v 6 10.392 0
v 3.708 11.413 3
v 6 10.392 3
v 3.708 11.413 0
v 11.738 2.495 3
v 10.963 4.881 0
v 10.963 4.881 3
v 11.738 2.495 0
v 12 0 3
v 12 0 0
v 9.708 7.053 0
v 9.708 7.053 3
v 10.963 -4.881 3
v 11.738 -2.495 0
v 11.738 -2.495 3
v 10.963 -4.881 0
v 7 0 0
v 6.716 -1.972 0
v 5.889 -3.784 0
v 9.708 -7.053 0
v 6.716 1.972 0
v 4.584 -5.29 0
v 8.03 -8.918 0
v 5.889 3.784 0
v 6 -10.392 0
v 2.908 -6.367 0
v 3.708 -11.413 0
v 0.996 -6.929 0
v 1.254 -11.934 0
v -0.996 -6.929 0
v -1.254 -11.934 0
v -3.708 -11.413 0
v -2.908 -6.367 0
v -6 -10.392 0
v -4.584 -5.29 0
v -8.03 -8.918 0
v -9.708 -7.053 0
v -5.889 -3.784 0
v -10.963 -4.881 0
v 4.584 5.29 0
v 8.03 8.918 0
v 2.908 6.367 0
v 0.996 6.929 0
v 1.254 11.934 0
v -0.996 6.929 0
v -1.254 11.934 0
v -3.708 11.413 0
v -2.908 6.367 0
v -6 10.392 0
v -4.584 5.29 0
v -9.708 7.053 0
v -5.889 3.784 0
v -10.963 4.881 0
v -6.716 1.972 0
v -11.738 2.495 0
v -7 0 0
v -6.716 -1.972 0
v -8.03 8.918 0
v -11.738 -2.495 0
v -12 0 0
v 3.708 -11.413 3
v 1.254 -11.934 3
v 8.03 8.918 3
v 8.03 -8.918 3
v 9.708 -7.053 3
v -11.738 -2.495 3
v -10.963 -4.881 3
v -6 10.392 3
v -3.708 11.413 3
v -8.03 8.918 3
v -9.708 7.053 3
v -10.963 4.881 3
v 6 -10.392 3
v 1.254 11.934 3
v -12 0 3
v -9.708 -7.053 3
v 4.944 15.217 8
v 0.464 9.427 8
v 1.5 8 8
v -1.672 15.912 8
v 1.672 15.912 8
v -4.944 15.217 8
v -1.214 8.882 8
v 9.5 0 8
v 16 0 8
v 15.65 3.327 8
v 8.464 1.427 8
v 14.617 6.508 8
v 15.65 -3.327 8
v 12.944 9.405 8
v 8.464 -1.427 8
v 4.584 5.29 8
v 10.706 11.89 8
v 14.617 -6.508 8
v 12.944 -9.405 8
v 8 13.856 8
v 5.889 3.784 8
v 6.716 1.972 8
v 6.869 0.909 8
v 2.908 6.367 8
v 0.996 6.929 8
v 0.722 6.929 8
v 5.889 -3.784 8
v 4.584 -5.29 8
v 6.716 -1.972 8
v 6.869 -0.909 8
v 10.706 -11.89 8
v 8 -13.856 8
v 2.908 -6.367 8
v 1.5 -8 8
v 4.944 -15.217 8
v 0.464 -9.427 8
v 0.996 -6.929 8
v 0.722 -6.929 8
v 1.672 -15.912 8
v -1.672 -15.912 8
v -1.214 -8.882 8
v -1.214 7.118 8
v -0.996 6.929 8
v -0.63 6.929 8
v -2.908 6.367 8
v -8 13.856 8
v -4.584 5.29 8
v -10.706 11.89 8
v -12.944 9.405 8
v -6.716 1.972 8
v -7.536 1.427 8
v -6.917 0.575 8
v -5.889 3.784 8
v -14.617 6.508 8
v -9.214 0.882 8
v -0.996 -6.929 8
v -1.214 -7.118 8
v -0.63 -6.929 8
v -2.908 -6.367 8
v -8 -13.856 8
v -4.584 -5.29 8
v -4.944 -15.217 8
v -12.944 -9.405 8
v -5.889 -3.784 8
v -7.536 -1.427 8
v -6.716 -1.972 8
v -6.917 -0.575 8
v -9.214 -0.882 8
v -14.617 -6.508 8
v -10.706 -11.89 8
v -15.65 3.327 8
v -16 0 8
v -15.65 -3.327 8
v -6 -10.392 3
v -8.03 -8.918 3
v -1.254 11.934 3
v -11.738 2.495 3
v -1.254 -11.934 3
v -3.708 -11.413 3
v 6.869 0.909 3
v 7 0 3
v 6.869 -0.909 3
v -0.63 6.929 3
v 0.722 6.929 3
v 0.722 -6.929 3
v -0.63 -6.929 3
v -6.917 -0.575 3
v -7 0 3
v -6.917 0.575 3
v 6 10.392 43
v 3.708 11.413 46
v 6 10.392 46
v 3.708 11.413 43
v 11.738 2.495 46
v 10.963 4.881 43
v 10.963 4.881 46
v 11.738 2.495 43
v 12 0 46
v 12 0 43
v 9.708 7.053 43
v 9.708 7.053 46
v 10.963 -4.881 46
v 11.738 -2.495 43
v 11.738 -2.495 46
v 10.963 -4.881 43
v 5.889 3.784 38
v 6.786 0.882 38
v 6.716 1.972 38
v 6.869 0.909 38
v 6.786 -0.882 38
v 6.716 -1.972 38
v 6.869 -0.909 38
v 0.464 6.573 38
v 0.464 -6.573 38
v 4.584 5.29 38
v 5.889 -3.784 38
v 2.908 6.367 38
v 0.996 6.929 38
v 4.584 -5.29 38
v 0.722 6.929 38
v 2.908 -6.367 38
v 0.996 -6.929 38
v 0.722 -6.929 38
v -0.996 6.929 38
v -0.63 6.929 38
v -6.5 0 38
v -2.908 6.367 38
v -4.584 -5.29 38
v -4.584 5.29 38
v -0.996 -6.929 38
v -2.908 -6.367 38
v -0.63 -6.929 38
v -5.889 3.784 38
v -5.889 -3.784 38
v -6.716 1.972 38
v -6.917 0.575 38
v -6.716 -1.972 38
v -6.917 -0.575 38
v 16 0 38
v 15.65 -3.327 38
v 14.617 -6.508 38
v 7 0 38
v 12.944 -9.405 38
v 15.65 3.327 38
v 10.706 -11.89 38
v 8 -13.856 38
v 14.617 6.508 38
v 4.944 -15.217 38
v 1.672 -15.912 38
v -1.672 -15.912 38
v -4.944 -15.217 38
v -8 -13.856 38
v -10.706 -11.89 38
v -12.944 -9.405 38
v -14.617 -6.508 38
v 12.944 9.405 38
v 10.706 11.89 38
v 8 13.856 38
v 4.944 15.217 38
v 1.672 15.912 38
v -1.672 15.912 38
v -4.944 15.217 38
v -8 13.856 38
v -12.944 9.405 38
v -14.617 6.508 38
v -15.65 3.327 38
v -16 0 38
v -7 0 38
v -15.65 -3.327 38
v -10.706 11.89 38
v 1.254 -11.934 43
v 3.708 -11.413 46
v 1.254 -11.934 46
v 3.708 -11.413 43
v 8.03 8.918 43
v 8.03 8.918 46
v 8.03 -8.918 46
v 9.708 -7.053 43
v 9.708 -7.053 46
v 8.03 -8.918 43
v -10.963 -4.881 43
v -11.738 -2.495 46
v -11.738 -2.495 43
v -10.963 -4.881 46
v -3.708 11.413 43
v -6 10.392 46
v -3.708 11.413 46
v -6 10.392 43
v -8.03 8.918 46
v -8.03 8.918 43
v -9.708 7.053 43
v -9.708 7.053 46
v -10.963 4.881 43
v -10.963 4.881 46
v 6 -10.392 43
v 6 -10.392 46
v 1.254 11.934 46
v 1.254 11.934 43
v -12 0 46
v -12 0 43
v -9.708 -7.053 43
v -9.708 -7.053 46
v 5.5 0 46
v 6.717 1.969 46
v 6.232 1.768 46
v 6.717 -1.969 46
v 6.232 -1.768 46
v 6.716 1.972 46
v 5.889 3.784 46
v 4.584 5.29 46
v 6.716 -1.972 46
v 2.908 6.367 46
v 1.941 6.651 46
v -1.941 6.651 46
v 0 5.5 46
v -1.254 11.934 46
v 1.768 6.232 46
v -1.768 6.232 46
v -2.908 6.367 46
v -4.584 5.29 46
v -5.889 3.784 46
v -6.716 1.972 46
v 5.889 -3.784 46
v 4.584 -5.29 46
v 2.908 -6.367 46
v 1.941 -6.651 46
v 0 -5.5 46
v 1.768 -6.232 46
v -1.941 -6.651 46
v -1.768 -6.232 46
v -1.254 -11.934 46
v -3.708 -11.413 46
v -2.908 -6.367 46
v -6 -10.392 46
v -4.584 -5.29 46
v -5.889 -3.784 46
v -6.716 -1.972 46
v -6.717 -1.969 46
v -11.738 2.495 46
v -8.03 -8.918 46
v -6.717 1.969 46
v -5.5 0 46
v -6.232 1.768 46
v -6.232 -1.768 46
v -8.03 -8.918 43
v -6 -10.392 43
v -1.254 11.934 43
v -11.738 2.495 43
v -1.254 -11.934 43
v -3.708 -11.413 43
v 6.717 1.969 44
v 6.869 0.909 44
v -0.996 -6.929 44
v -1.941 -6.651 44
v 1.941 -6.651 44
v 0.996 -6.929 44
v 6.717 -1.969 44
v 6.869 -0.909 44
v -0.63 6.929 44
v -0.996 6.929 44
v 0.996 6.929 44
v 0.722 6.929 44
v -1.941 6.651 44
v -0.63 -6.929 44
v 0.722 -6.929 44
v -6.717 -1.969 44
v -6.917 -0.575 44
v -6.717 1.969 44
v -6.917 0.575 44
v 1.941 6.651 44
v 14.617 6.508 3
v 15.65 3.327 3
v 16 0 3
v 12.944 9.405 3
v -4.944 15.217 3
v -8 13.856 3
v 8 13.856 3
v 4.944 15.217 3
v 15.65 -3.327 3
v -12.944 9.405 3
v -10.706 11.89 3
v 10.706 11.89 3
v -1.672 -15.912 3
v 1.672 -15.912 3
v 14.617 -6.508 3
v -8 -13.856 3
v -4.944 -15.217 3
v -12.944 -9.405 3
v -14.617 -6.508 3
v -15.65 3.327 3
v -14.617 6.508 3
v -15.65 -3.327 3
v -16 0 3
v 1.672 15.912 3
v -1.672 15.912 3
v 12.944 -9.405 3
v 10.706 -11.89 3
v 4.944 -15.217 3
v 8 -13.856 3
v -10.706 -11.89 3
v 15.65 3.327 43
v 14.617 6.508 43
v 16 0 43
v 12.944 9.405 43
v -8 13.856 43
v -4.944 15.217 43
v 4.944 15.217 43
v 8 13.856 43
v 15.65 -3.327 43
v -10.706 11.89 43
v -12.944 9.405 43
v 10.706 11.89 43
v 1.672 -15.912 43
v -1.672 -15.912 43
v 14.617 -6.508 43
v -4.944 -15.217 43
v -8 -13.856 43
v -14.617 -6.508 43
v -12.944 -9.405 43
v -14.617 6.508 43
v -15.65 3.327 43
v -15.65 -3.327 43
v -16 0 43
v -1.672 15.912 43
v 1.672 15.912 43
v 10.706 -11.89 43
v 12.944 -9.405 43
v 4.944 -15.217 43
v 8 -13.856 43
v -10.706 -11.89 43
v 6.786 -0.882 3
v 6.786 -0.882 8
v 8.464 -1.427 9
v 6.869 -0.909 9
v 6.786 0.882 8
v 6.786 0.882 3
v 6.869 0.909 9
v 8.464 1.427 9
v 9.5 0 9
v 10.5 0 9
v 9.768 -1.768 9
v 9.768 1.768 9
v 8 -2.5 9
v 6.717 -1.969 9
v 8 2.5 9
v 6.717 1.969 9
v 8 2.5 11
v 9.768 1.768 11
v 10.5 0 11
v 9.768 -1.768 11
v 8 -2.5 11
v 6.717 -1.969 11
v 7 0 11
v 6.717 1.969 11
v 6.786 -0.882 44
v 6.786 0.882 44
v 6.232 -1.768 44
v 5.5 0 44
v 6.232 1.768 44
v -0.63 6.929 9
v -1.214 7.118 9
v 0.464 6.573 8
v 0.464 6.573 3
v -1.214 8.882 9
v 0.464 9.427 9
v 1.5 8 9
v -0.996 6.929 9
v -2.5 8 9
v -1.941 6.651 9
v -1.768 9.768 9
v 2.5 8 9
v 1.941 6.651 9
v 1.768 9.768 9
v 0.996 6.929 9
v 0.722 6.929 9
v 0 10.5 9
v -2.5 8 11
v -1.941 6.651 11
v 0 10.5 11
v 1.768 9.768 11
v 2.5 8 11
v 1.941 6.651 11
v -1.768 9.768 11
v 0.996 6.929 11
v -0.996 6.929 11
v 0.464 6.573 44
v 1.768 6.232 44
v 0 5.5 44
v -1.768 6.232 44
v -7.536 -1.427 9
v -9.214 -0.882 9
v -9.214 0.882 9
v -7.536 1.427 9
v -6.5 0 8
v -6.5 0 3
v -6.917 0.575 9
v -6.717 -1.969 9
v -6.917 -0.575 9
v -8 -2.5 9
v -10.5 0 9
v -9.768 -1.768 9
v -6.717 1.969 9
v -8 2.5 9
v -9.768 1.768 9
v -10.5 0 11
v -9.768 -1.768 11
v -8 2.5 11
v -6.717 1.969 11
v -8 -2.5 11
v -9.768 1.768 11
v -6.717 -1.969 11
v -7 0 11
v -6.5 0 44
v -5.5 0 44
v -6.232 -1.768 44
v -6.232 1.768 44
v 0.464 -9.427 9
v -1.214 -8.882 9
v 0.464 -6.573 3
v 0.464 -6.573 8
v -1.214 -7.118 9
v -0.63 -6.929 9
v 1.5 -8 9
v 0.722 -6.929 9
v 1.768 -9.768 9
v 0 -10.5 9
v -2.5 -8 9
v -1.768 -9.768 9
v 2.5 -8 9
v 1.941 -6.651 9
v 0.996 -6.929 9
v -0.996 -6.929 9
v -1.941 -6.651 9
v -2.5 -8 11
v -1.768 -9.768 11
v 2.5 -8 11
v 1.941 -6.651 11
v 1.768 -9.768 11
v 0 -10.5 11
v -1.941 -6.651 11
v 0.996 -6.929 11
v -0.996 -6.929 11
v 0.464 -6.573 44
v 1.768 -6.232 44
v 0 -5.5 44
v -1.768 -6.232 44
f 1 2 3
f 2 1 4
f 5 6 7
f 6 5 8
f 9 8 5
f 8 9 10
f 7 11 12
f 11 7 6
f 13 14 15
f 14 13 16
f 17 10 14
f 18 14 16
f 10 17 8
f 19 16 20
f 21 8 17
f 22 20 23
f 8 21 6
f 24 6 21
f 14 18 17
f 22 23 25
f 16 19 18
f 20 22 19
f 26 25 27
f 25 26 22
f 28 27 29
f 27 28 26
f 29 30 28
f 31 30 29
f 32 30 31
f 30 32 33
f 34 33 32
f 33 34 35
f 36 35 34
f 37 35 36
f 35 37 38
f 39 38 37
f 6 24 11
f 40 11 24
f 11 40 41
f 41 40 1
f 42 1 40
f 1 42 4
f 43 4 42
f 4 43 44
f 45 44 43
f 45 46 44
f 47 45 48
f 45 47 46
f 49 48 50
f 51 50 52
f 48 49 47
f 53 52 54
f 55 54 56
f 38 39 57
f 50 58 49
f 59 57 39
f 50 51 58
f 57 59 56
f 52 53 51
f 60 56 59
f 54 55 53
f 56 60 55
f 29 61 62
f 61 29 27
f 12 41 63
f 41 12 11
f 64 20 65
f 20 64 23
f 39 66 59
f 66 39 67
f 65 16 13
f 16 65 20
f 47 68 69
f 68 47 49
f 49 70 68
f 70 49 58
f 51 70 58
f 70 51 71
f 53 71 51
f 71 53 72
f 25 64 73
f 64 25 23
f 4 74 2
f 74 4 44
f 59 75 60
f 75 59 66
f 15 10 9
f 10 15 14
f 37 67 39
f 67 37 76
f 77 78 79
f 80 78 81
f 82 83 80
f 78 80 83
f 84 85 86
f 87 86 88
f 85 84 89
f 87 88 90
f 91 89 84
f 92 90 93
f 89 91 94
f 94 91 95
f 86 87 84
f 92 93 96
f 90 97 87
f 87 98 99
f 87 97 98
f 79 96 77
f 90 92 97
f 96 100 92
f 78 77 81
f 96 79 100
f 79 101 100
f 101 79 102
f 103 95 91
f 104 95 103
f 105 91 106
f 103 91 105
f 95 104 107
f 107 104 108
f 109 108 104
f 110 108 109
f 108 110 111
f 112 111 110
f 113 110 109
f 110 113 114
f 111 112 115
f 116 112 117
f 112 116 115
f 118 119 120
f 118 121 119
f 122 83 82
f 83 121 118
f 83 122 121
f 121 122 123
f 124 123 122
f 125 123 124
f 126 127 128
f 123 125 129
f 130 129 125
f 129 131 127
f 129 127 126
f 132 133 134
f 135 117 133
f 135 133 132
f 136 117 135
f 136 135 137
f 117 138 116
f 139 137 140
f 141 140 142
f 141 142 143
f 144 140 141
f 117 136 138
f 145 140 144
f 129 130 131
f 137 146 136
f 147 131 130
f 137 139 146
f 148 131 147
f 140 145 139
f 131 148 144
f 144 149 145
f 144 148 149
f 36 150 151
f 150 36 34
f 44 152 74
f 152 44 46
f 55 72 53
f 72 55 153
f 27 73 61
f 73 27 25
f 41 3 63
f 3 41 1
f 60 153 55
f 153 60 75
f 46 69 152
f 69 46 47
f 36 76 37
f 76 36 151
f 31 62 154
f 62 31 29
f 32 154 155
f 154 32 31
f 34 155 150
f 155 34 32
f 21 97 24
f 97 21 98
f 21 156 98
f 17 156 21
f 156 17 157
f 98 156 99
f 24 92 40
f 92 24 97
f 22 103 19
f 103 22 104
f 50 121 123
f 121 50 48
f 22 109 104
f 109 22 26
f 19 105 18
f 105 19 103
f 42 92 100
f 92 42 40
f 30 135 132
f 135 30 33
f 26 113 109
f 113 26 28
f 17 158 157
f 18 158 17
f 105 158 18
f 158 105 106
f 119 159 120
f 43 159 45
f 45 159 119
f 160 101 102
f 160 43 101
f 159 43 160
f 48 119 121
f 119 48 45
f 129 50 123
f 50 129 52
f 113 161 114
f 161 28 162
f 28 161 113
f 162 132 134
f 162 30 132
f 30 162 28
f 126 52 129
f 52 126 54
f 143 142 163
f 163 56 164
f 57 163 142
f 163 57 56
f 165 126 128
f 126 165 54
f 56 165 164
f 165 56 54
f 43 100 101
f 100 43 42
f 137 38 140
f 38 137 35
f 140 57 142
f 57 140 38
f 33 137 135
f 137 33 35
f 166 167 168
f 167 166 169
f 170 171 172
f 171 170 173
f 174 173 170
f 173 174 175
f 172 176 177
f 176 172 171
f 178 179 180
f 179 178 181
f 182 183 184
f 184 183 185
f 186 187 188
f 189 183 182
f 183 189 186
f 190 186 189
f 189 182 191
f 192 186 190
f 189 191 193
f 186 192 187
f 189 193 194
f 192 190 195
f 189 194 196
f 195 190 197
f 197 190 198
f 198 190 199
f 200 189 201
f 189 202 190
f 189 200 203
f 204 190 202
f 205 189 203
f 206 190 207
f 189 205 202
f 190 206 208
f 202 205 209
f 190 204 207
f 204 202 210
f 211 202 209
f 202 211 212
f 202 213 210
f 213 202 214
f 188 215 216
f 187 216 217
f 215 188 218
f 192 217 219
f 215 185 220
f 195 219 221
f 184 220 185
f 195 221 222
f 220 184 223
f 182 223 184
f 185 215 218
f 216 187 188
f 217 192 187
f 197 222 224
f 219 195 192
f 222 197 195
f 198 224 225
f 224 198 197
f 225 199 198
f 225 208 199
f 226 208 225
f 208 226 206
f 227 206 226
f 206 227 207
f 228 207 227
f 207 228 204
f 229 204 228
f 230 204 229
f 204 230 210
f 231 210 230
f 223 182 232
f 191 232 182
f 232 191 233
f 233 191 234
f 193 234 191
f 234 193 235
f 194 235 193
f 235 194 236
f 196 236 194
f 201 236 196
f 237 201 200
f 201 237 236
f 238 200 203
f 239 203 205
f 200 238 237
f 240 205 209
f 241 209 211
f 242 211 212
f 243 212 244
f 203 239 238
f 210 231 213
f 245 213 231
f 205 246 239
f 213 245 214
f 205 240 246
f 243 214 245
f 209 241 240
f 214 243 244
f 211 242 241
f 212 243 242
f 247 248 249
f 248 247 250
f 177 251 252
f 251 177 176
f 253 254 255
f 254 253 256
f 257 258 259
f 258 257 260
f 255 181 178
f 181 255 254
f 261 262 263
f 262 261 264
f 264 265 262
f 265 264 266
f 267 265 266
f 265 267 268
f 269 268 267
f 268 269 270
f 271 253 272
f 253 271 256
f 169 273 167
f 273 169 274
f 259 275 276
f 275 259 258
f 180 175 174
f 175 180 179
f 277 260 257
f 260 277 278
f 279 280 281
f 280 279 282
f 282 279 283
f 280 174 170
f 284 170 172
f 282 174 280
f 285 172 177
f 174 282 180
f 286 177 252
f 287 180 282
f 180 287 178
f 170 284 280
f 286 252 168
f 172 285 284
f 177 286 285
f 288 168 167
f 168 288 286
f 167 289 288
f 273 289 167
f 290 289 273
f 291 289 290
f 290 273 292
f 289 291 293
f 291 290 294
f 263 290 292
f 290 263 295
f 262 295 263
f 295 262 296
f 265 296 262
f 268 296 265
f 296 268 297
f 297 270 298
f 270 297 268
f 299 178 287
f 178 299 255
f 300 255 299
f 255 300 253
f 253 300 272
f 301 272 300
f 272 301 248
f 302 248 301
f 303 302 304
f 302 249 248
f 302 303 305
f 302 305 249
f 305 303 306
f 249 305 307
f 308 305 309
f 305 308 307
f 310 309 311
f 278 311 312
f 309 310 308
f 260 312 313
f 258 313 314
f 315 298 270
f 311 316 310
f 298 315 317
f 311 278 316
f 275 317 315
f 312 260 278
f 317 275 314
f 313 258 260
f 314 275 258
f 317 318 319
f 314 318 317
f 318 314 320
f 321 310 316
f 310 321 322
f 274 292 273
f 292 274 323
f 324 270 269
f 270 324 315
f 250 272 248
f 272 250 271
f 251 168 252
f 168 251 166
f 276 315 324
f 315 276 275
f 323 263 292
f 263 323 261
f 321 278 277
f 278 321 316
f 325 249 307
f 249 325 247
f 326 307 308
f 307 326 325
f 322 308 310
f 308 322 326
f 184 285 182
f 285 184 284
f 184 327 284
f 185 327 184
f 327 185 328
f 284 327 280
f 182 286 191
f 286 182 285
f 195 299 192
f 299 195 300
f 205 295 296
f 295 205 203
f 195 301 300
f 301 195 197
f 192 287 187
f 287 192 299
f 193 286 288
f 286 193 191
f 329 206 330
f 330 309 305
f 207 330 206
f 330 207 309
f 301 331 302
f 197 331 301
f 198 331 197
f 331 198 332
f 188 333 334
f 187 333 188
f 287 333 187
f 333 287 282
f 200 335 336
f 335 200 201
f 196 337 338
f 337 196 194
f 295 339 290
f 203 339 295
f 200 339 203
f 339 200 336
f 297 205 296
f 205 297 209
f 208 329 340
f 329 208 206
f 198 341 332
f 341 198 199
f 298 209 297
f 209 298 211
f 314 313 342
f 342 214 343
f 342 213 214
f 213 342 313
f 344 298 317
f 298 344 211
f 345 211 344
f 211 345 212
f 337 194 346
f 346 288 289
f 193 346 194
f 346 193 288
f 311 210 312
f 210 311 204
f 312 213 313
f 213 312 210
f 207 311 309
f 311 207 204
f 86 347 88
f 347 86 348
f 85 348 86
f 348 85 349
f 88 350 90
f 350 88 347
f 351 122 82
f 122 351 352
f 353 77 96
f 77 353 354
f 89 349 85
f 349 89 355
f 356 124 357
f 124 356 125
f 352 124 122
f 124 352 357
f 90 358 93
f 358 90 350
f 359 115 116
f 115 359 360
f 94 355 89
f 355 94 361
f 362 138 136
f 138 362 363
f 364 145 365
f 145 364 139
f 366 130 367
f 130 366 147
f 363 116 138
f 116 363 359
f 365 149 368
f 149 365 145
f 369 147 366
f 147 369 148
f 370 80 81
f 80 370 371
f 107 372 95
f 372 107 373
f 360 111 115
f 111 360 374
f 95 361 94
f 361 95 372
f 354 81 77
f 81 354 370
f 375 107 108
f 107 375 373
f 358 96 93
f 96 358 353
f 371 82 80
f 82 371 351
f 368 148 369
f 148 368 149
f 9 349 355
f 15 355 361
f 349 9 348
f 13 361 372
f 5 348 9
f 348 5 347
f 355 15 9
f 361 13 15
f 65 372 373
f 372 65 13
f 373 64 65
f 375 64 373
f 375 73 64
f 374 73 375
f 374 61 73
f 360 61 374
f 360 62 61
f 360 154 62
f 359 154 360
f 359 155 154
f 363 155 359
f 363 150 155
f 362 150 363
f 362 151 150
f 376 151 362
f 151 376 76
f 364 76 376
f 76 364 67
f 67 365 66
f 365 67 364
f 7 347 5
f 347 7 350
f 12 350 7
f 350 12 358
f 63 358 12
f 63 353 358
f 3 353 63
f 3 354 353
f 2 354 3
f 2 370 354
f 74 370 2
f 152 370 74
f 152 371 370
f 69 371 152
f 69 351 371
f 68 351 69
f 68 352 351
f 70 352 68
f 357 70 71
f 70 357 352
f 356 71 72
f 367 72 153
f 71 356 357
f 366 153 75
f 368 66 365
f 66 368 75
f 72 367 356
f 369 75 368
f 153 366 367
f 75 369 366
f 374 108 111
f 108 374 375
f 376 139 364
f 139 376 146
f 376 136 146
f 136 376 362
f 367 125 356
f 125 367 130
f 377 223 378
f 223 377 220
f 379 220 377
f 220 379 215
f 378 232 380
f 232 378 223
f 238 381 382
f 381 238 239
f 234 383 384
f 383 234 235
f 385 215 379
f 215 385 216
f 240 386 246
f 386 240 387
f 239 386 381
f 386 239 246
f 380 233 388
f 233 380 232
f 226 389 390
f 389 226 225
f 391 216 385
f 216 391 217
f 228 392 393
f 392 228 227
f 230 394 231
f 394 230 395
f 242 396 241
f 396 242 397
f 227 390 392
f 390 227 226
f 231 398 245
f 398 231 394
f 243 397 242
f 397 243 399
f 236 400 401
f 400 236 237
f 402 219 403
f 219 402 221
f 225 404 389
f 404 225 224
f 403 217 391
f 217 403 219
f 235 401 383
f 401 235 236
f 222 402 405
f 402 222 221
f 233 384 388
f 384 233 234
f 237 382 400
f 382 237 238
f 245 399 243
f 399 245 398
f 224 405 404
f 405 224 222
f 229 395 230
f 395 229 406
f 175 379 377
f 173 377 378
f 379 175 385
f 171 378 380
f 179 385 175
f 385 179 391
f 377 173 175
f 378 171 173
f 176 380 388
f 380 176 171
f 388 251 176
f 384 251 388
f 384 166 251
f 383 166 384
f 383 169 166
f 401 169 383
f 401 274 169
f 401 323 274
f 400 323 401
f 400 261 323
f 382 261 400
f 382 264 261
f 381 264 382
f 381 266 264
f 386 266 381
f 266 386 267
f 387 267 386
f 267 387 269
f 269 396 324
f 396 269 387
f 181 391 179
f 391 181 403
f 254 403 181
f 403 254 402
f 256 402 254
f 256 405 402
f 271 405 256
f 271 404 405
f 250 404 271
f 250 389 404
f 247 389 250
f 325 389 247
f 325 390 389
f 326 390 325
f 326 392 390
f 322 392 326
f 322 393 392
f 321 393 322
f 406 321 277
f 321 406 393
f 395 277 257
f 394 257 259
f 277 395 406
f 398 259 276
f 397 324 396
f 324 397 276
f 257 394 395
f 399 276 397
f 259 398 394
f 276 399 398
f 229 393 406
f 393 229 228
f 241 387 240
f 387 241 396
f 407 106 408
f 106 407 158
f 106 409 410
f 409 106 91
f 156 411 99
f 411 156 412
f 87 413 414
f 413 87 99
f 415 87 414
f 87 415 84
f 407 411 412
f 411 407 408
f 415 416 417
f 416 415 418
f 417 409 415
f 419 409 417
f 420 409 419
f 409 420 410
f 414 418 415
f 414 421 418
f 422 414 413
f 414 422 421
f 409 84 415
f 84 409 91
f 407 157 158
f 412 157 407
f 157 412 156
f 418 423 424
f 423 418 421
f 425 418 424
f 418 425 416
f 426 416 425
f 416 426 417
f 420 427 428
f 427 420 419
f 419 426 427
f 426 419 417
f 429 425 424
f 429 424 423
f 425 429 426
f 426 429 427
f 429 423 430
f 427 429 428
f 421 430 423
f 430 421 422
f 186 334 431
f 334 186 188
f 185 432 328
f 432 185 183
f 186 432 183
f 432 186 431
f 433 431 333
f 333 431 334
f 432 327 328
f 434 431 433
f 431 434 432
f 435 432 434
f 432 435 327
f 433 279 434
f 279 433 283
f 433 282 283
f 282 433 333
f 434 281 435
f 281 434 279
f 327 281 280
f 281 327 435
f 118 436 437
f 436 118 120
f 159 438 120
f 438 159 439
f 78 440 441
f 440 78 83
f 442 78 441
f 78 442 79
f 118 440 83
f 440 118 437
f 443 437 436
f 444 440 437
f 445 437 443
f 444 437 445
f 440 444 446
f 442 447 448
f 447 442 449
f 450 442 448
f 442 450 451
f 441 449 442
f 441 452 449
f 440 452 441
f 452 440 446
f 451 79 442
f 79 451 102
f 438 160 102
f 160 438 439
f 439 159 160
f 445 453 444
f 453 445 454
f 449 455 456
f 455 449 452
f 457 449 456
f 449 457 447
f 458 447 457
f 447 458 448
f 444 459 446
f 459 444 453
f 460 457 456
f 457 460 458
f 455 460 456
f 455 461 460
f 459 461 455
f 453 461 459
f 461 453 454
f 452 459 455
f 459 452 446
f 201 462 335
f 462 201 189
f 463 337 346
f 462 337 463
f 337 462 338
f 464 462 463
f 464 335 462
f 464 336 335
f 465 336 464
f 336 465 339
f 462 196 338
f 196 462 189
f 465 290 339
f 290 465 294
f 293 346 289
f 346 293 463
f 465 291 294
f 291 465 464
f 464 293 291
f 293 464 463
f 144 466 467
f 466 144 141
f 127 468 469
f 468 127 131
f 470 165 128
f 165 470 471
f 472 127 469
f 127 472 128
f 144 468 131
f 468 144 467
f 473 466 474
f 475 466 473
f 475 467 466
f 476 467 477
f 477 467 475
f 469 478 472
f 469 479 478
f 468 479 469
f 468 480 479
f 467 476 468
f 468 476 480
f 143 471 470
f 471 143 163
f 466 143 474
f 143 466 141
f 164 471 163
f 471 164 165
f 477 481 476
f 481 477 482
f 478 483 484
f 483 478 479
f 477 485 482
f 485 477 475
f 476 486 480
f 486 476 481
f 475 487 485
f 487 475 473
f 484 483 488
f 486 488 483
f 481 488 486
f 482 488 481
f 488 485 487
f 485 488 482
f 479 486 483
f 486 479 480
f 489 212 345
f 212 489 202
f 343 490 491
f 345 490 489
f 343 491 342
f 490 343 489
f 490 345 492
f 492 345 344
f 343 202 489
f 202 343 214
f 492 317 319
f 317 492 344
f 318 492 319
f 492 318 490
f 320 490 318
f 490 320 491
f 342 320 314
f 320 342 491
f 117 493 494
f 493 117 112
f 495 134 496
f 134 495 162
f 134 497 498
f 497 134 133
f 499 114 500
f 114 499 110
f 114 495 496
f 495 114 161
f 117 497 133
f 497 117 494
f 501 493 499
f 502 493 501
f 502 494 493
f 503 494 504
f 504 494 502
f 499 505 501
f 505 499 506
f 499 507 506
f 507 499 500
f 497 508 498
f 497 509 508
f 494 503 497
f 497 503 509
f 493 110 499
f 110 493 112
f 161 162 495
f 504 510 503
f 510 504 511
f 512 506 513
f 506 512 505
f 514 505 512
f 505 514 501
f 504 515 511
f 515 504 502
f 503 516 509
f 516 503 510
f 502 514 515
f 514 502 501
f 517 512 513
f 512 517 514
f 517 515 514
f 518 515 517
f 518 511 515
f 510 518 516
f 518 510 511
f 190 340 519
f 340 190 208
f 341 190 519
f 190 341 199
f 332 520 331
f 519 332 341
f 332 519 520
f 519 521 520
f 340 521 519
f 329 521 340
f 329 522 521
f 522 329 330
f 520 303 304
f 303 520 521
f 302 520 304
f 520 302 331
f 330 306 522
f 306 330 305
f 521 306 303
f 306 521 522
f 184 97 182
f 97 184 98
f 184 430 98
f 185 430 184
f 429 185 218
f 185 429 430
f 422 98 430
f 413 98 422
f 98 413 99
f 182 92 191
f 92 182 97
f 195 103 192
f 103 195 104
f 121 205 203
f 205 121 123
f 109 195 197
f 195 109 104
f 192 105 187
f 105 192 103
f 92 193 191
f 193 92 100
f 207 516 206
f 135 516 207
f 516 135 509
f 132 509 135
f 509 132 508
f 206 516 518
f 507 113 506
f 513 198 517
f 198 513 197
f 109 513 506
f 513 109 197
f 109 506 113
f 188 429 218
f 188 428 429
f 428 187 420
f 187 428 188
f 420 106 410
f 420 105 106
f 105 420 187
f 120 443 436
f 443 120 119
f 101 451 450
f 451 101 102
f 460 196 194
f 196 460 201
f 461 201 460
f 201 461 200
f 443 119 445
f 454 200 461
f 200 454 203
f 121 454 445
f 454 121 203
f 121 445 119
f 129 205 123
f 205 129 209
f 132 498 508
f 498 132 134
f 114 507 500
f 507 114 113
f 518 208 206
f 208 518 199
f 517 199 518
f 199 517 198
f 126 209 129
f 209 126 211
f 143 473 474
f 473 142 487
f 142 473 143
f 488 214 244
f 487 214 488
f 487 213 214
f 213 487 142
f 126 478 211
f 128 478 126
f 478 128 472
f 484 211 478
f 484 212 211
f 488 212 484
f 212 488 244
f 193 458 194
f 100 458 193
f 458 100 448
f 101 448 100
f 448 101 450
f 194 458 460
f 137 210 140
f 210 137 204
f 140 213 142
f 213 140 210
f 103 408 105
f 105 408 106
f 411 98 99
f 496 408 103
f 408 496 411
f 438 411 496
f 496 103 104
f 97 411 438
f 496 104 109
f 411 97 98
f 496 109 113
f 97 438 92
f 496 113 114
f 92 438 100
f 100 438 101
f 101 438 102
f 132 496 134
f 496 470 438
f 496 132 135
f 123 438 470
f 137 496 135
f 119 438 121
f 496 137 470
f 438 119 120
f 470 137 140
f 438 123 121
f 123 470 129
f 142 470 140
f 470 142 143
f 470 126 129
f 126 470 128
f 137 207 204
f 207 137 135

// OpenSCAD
// Parameters
shaft_length = 30; // Shortened shaft
shaft_radius = 7;  // Increased shaft radius
hub_radius = 12;   // Adjusted hub radius for compactness
hub_length = 8;    // Shortened hub length
flange_radius = 16; // Slightly increased flange radius
flange_thickness = 5; // Thickened flange
bolt_radius = 1.5;
bolt_length = 6; // Shortened bolts
nut_radius = 2.5;
nut_thickness = 2;
bolt_hole_offset = 8; // Adjusted bolt hole offset
num_bolts = 4;

// Function to create a bolt
module bolt() {
    cylinder(h = bolt_length, r = bolt_radius);
    translate([0, 0, bolt_length])
        cylinder(h = nut_thickness, r = nut_radius);
}

// Function to create a flange plate
module flange_plate() {
    difference() {
        cylinder(h = flange_thickness, r = flange_radius);
        cylinder(h = flange_thickness + 1, r = shaft_radius);
        for (i = [0:num_bolts-1]) {
            angle = i * 360 / num_bolts;
            translate([bolt_hole_offset * cos(angle), bolt_hole_offset * sin(angle), -0.5])
                cylinder(h = flange_thickness + 1, r = bolt_radius);
        }
    }
}

// Function to create a hub
module hub() {
    difference() {
        cylinder(h = hub_length, r = hub_radius);
        cylinder(h = hub_length + 1, r = shaft_radius);
    }
}

// Function to create the central shaft
module central_shaft() {
    cylinder(h = shaft_length, r = shaft_radius);
}

// Function to assemble the coupling
module coupling() {
    // Central shaft
    translate([0, 0, hub_length])
        central_shaft();

    // Input hub
    hub();

    // Output hub
    translate([0, 0, shaft_length + hub_length])
        hub();

    // Flange plates
    translate([0, 0, hub_length - flange_thickness])
        flange_plate();
    translate([0, 0, shaft_length + hub_length])
        flange_plate();

    // Bolts and nuts
    for (i = [0:num_bolts-1]) {
        angle = i * 360 / num_bolts;
        translate([bolt_hole_offset * cos(angle), bolt_hole_offset * sin(angle), hub_length - flange_thickness])
            bolt();
        translate([bolt_hole_offset * cos(angle), bolt_hole_offset * sin(angle), shaft_length + hub_length])
            bolt();
    }
}

// Render the coupling
coupling();
